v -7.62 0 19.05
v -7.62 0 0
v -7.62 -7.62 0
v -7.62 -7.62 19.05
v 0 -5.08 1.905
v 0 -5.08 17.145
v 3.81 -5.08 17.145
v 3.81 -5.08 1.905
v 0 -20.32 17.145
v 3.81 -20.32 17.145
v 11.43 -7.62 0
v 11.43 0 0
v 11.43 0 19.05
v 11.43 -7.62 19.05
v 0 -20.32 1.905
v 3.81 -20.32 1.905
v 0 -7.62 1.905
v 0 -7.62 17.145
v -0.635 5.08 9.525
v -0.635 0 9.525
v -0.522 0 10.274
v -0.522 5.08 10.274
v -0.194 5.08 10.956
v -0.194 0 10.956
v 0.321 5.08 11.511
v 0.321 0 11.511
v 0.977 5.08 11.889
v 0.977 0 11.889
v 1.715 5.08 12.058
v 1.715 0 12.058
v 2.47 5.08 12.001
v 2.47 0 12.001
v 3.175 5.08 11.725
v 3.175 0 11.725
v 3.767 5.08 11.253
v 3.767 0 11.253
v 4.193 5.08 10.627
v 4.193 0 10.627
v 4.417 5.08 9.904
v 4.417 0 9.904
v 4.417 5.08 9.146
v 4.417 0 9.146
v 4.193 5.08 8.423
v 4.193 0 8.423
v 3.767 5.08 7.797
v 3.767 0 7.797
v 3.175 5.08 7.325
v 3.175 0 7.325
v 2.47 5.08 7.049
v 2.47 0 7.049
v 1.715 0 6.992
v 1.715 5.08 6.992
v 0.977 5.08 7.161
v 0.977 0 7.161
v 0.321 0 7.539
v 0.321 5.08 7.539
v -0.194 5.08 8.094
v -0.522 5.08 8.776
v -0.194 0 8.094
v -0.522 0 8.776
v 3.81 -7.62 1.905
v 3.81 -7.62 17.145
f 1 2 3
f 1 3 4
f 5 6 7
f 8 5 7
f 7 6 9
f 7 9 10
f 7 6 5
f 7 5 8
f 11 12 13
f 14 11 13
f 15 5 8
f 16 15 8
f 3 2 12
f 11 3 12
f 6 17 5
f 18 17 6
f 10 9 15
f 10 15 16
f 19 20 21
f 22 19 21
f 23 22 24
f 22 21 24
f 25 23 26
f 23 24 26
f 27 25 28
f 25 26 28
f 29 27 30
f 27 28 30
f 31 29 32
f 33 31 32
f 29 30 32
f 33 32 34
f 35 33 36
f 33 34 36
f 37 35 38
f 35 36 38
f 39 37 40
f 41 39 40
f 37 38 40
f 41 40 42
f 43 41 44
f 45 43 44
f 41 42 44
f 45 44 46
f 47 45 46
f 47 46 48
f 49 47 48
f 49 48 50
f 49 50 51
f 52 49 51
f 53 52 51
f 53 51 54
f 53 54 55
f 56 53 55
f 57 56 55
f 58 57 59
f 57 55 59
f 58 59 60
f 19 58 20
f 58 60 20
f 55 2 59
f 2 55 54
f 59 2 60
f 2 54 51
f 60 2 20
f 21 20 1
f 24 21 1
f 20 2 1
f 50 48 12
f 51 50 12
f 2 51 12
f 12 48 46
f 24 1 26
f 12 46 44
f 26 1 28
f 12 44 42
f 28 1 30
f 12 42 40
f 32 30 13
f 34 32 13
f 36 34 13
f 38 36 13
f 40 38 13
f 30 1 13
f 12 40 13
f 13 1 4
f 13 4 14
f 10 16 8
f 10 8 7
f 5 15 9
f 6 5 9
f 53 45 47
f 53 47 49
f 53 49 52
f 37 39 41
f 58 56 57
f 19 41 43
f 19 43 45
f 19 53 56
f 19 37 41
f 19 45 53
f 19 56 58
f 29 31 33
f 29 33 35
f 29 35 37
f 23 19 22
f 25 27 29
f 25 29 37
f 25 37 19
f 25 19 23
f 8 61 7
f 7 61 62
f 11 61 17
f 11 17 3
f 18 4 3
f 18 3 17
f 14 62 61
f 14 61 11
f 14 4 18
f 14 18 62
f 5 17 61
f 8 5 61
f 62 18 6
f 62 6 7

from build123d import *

# Parameters (mm, degrees)
F0_W     = 19.05
F0_H     = 19.05
F1_DEPTH = 7.62
F2_W     = 3.81
F2_H     = 15.24
F3_DEPTH = 2.54
F4_R     = 2.54
F5_DEPTH = 5.08
F6_DEPTH = 15.24


# Not quite as in the source:
# - a feature names something its author has since deleted; it is built from what else it names


with BuildPart() as f1:
    # F0 (on Front) → F1 (new body)
    with BuildSketch(Plane.XZ):
        with Locations((1.905, 9.525)):
            Rectangle(F0_W, F0_H)
    extrude(amount=F1_DEPTH)

    # F2 (on face) → F3 (cut)
    with BuildSketch(Plane.XZ.offset(7.62)):
        with Locations((1.905, 9.525)):
            Rectangle(F2_W, F2_H)
    extrude(amount=-F3_DEPTH, mode=Mode.SUBTRACT)

    # F4 (on face) → F5 (join)
    with BuildSketch(Plane(origin=(0, 0, 0), x_dir=(-1, 0, 0), z_dir=(0, 1, 0))):
        with Locations((-1.905, 9.525)):
            Circle(F4_R)
    extrude(amount=F5_DEPTH)


with BuildPart() as f6:
    # F6 (new): a face of the model
    f6_faces = [f1.part.faces().sort_by_distance(p)[0] for p in [
        (1.905, -5.08, 9.525),
    ]]
    extrude(f6_faces, amount=F6_DEPTH)


solid = Compound([f1.part, f6.part])
